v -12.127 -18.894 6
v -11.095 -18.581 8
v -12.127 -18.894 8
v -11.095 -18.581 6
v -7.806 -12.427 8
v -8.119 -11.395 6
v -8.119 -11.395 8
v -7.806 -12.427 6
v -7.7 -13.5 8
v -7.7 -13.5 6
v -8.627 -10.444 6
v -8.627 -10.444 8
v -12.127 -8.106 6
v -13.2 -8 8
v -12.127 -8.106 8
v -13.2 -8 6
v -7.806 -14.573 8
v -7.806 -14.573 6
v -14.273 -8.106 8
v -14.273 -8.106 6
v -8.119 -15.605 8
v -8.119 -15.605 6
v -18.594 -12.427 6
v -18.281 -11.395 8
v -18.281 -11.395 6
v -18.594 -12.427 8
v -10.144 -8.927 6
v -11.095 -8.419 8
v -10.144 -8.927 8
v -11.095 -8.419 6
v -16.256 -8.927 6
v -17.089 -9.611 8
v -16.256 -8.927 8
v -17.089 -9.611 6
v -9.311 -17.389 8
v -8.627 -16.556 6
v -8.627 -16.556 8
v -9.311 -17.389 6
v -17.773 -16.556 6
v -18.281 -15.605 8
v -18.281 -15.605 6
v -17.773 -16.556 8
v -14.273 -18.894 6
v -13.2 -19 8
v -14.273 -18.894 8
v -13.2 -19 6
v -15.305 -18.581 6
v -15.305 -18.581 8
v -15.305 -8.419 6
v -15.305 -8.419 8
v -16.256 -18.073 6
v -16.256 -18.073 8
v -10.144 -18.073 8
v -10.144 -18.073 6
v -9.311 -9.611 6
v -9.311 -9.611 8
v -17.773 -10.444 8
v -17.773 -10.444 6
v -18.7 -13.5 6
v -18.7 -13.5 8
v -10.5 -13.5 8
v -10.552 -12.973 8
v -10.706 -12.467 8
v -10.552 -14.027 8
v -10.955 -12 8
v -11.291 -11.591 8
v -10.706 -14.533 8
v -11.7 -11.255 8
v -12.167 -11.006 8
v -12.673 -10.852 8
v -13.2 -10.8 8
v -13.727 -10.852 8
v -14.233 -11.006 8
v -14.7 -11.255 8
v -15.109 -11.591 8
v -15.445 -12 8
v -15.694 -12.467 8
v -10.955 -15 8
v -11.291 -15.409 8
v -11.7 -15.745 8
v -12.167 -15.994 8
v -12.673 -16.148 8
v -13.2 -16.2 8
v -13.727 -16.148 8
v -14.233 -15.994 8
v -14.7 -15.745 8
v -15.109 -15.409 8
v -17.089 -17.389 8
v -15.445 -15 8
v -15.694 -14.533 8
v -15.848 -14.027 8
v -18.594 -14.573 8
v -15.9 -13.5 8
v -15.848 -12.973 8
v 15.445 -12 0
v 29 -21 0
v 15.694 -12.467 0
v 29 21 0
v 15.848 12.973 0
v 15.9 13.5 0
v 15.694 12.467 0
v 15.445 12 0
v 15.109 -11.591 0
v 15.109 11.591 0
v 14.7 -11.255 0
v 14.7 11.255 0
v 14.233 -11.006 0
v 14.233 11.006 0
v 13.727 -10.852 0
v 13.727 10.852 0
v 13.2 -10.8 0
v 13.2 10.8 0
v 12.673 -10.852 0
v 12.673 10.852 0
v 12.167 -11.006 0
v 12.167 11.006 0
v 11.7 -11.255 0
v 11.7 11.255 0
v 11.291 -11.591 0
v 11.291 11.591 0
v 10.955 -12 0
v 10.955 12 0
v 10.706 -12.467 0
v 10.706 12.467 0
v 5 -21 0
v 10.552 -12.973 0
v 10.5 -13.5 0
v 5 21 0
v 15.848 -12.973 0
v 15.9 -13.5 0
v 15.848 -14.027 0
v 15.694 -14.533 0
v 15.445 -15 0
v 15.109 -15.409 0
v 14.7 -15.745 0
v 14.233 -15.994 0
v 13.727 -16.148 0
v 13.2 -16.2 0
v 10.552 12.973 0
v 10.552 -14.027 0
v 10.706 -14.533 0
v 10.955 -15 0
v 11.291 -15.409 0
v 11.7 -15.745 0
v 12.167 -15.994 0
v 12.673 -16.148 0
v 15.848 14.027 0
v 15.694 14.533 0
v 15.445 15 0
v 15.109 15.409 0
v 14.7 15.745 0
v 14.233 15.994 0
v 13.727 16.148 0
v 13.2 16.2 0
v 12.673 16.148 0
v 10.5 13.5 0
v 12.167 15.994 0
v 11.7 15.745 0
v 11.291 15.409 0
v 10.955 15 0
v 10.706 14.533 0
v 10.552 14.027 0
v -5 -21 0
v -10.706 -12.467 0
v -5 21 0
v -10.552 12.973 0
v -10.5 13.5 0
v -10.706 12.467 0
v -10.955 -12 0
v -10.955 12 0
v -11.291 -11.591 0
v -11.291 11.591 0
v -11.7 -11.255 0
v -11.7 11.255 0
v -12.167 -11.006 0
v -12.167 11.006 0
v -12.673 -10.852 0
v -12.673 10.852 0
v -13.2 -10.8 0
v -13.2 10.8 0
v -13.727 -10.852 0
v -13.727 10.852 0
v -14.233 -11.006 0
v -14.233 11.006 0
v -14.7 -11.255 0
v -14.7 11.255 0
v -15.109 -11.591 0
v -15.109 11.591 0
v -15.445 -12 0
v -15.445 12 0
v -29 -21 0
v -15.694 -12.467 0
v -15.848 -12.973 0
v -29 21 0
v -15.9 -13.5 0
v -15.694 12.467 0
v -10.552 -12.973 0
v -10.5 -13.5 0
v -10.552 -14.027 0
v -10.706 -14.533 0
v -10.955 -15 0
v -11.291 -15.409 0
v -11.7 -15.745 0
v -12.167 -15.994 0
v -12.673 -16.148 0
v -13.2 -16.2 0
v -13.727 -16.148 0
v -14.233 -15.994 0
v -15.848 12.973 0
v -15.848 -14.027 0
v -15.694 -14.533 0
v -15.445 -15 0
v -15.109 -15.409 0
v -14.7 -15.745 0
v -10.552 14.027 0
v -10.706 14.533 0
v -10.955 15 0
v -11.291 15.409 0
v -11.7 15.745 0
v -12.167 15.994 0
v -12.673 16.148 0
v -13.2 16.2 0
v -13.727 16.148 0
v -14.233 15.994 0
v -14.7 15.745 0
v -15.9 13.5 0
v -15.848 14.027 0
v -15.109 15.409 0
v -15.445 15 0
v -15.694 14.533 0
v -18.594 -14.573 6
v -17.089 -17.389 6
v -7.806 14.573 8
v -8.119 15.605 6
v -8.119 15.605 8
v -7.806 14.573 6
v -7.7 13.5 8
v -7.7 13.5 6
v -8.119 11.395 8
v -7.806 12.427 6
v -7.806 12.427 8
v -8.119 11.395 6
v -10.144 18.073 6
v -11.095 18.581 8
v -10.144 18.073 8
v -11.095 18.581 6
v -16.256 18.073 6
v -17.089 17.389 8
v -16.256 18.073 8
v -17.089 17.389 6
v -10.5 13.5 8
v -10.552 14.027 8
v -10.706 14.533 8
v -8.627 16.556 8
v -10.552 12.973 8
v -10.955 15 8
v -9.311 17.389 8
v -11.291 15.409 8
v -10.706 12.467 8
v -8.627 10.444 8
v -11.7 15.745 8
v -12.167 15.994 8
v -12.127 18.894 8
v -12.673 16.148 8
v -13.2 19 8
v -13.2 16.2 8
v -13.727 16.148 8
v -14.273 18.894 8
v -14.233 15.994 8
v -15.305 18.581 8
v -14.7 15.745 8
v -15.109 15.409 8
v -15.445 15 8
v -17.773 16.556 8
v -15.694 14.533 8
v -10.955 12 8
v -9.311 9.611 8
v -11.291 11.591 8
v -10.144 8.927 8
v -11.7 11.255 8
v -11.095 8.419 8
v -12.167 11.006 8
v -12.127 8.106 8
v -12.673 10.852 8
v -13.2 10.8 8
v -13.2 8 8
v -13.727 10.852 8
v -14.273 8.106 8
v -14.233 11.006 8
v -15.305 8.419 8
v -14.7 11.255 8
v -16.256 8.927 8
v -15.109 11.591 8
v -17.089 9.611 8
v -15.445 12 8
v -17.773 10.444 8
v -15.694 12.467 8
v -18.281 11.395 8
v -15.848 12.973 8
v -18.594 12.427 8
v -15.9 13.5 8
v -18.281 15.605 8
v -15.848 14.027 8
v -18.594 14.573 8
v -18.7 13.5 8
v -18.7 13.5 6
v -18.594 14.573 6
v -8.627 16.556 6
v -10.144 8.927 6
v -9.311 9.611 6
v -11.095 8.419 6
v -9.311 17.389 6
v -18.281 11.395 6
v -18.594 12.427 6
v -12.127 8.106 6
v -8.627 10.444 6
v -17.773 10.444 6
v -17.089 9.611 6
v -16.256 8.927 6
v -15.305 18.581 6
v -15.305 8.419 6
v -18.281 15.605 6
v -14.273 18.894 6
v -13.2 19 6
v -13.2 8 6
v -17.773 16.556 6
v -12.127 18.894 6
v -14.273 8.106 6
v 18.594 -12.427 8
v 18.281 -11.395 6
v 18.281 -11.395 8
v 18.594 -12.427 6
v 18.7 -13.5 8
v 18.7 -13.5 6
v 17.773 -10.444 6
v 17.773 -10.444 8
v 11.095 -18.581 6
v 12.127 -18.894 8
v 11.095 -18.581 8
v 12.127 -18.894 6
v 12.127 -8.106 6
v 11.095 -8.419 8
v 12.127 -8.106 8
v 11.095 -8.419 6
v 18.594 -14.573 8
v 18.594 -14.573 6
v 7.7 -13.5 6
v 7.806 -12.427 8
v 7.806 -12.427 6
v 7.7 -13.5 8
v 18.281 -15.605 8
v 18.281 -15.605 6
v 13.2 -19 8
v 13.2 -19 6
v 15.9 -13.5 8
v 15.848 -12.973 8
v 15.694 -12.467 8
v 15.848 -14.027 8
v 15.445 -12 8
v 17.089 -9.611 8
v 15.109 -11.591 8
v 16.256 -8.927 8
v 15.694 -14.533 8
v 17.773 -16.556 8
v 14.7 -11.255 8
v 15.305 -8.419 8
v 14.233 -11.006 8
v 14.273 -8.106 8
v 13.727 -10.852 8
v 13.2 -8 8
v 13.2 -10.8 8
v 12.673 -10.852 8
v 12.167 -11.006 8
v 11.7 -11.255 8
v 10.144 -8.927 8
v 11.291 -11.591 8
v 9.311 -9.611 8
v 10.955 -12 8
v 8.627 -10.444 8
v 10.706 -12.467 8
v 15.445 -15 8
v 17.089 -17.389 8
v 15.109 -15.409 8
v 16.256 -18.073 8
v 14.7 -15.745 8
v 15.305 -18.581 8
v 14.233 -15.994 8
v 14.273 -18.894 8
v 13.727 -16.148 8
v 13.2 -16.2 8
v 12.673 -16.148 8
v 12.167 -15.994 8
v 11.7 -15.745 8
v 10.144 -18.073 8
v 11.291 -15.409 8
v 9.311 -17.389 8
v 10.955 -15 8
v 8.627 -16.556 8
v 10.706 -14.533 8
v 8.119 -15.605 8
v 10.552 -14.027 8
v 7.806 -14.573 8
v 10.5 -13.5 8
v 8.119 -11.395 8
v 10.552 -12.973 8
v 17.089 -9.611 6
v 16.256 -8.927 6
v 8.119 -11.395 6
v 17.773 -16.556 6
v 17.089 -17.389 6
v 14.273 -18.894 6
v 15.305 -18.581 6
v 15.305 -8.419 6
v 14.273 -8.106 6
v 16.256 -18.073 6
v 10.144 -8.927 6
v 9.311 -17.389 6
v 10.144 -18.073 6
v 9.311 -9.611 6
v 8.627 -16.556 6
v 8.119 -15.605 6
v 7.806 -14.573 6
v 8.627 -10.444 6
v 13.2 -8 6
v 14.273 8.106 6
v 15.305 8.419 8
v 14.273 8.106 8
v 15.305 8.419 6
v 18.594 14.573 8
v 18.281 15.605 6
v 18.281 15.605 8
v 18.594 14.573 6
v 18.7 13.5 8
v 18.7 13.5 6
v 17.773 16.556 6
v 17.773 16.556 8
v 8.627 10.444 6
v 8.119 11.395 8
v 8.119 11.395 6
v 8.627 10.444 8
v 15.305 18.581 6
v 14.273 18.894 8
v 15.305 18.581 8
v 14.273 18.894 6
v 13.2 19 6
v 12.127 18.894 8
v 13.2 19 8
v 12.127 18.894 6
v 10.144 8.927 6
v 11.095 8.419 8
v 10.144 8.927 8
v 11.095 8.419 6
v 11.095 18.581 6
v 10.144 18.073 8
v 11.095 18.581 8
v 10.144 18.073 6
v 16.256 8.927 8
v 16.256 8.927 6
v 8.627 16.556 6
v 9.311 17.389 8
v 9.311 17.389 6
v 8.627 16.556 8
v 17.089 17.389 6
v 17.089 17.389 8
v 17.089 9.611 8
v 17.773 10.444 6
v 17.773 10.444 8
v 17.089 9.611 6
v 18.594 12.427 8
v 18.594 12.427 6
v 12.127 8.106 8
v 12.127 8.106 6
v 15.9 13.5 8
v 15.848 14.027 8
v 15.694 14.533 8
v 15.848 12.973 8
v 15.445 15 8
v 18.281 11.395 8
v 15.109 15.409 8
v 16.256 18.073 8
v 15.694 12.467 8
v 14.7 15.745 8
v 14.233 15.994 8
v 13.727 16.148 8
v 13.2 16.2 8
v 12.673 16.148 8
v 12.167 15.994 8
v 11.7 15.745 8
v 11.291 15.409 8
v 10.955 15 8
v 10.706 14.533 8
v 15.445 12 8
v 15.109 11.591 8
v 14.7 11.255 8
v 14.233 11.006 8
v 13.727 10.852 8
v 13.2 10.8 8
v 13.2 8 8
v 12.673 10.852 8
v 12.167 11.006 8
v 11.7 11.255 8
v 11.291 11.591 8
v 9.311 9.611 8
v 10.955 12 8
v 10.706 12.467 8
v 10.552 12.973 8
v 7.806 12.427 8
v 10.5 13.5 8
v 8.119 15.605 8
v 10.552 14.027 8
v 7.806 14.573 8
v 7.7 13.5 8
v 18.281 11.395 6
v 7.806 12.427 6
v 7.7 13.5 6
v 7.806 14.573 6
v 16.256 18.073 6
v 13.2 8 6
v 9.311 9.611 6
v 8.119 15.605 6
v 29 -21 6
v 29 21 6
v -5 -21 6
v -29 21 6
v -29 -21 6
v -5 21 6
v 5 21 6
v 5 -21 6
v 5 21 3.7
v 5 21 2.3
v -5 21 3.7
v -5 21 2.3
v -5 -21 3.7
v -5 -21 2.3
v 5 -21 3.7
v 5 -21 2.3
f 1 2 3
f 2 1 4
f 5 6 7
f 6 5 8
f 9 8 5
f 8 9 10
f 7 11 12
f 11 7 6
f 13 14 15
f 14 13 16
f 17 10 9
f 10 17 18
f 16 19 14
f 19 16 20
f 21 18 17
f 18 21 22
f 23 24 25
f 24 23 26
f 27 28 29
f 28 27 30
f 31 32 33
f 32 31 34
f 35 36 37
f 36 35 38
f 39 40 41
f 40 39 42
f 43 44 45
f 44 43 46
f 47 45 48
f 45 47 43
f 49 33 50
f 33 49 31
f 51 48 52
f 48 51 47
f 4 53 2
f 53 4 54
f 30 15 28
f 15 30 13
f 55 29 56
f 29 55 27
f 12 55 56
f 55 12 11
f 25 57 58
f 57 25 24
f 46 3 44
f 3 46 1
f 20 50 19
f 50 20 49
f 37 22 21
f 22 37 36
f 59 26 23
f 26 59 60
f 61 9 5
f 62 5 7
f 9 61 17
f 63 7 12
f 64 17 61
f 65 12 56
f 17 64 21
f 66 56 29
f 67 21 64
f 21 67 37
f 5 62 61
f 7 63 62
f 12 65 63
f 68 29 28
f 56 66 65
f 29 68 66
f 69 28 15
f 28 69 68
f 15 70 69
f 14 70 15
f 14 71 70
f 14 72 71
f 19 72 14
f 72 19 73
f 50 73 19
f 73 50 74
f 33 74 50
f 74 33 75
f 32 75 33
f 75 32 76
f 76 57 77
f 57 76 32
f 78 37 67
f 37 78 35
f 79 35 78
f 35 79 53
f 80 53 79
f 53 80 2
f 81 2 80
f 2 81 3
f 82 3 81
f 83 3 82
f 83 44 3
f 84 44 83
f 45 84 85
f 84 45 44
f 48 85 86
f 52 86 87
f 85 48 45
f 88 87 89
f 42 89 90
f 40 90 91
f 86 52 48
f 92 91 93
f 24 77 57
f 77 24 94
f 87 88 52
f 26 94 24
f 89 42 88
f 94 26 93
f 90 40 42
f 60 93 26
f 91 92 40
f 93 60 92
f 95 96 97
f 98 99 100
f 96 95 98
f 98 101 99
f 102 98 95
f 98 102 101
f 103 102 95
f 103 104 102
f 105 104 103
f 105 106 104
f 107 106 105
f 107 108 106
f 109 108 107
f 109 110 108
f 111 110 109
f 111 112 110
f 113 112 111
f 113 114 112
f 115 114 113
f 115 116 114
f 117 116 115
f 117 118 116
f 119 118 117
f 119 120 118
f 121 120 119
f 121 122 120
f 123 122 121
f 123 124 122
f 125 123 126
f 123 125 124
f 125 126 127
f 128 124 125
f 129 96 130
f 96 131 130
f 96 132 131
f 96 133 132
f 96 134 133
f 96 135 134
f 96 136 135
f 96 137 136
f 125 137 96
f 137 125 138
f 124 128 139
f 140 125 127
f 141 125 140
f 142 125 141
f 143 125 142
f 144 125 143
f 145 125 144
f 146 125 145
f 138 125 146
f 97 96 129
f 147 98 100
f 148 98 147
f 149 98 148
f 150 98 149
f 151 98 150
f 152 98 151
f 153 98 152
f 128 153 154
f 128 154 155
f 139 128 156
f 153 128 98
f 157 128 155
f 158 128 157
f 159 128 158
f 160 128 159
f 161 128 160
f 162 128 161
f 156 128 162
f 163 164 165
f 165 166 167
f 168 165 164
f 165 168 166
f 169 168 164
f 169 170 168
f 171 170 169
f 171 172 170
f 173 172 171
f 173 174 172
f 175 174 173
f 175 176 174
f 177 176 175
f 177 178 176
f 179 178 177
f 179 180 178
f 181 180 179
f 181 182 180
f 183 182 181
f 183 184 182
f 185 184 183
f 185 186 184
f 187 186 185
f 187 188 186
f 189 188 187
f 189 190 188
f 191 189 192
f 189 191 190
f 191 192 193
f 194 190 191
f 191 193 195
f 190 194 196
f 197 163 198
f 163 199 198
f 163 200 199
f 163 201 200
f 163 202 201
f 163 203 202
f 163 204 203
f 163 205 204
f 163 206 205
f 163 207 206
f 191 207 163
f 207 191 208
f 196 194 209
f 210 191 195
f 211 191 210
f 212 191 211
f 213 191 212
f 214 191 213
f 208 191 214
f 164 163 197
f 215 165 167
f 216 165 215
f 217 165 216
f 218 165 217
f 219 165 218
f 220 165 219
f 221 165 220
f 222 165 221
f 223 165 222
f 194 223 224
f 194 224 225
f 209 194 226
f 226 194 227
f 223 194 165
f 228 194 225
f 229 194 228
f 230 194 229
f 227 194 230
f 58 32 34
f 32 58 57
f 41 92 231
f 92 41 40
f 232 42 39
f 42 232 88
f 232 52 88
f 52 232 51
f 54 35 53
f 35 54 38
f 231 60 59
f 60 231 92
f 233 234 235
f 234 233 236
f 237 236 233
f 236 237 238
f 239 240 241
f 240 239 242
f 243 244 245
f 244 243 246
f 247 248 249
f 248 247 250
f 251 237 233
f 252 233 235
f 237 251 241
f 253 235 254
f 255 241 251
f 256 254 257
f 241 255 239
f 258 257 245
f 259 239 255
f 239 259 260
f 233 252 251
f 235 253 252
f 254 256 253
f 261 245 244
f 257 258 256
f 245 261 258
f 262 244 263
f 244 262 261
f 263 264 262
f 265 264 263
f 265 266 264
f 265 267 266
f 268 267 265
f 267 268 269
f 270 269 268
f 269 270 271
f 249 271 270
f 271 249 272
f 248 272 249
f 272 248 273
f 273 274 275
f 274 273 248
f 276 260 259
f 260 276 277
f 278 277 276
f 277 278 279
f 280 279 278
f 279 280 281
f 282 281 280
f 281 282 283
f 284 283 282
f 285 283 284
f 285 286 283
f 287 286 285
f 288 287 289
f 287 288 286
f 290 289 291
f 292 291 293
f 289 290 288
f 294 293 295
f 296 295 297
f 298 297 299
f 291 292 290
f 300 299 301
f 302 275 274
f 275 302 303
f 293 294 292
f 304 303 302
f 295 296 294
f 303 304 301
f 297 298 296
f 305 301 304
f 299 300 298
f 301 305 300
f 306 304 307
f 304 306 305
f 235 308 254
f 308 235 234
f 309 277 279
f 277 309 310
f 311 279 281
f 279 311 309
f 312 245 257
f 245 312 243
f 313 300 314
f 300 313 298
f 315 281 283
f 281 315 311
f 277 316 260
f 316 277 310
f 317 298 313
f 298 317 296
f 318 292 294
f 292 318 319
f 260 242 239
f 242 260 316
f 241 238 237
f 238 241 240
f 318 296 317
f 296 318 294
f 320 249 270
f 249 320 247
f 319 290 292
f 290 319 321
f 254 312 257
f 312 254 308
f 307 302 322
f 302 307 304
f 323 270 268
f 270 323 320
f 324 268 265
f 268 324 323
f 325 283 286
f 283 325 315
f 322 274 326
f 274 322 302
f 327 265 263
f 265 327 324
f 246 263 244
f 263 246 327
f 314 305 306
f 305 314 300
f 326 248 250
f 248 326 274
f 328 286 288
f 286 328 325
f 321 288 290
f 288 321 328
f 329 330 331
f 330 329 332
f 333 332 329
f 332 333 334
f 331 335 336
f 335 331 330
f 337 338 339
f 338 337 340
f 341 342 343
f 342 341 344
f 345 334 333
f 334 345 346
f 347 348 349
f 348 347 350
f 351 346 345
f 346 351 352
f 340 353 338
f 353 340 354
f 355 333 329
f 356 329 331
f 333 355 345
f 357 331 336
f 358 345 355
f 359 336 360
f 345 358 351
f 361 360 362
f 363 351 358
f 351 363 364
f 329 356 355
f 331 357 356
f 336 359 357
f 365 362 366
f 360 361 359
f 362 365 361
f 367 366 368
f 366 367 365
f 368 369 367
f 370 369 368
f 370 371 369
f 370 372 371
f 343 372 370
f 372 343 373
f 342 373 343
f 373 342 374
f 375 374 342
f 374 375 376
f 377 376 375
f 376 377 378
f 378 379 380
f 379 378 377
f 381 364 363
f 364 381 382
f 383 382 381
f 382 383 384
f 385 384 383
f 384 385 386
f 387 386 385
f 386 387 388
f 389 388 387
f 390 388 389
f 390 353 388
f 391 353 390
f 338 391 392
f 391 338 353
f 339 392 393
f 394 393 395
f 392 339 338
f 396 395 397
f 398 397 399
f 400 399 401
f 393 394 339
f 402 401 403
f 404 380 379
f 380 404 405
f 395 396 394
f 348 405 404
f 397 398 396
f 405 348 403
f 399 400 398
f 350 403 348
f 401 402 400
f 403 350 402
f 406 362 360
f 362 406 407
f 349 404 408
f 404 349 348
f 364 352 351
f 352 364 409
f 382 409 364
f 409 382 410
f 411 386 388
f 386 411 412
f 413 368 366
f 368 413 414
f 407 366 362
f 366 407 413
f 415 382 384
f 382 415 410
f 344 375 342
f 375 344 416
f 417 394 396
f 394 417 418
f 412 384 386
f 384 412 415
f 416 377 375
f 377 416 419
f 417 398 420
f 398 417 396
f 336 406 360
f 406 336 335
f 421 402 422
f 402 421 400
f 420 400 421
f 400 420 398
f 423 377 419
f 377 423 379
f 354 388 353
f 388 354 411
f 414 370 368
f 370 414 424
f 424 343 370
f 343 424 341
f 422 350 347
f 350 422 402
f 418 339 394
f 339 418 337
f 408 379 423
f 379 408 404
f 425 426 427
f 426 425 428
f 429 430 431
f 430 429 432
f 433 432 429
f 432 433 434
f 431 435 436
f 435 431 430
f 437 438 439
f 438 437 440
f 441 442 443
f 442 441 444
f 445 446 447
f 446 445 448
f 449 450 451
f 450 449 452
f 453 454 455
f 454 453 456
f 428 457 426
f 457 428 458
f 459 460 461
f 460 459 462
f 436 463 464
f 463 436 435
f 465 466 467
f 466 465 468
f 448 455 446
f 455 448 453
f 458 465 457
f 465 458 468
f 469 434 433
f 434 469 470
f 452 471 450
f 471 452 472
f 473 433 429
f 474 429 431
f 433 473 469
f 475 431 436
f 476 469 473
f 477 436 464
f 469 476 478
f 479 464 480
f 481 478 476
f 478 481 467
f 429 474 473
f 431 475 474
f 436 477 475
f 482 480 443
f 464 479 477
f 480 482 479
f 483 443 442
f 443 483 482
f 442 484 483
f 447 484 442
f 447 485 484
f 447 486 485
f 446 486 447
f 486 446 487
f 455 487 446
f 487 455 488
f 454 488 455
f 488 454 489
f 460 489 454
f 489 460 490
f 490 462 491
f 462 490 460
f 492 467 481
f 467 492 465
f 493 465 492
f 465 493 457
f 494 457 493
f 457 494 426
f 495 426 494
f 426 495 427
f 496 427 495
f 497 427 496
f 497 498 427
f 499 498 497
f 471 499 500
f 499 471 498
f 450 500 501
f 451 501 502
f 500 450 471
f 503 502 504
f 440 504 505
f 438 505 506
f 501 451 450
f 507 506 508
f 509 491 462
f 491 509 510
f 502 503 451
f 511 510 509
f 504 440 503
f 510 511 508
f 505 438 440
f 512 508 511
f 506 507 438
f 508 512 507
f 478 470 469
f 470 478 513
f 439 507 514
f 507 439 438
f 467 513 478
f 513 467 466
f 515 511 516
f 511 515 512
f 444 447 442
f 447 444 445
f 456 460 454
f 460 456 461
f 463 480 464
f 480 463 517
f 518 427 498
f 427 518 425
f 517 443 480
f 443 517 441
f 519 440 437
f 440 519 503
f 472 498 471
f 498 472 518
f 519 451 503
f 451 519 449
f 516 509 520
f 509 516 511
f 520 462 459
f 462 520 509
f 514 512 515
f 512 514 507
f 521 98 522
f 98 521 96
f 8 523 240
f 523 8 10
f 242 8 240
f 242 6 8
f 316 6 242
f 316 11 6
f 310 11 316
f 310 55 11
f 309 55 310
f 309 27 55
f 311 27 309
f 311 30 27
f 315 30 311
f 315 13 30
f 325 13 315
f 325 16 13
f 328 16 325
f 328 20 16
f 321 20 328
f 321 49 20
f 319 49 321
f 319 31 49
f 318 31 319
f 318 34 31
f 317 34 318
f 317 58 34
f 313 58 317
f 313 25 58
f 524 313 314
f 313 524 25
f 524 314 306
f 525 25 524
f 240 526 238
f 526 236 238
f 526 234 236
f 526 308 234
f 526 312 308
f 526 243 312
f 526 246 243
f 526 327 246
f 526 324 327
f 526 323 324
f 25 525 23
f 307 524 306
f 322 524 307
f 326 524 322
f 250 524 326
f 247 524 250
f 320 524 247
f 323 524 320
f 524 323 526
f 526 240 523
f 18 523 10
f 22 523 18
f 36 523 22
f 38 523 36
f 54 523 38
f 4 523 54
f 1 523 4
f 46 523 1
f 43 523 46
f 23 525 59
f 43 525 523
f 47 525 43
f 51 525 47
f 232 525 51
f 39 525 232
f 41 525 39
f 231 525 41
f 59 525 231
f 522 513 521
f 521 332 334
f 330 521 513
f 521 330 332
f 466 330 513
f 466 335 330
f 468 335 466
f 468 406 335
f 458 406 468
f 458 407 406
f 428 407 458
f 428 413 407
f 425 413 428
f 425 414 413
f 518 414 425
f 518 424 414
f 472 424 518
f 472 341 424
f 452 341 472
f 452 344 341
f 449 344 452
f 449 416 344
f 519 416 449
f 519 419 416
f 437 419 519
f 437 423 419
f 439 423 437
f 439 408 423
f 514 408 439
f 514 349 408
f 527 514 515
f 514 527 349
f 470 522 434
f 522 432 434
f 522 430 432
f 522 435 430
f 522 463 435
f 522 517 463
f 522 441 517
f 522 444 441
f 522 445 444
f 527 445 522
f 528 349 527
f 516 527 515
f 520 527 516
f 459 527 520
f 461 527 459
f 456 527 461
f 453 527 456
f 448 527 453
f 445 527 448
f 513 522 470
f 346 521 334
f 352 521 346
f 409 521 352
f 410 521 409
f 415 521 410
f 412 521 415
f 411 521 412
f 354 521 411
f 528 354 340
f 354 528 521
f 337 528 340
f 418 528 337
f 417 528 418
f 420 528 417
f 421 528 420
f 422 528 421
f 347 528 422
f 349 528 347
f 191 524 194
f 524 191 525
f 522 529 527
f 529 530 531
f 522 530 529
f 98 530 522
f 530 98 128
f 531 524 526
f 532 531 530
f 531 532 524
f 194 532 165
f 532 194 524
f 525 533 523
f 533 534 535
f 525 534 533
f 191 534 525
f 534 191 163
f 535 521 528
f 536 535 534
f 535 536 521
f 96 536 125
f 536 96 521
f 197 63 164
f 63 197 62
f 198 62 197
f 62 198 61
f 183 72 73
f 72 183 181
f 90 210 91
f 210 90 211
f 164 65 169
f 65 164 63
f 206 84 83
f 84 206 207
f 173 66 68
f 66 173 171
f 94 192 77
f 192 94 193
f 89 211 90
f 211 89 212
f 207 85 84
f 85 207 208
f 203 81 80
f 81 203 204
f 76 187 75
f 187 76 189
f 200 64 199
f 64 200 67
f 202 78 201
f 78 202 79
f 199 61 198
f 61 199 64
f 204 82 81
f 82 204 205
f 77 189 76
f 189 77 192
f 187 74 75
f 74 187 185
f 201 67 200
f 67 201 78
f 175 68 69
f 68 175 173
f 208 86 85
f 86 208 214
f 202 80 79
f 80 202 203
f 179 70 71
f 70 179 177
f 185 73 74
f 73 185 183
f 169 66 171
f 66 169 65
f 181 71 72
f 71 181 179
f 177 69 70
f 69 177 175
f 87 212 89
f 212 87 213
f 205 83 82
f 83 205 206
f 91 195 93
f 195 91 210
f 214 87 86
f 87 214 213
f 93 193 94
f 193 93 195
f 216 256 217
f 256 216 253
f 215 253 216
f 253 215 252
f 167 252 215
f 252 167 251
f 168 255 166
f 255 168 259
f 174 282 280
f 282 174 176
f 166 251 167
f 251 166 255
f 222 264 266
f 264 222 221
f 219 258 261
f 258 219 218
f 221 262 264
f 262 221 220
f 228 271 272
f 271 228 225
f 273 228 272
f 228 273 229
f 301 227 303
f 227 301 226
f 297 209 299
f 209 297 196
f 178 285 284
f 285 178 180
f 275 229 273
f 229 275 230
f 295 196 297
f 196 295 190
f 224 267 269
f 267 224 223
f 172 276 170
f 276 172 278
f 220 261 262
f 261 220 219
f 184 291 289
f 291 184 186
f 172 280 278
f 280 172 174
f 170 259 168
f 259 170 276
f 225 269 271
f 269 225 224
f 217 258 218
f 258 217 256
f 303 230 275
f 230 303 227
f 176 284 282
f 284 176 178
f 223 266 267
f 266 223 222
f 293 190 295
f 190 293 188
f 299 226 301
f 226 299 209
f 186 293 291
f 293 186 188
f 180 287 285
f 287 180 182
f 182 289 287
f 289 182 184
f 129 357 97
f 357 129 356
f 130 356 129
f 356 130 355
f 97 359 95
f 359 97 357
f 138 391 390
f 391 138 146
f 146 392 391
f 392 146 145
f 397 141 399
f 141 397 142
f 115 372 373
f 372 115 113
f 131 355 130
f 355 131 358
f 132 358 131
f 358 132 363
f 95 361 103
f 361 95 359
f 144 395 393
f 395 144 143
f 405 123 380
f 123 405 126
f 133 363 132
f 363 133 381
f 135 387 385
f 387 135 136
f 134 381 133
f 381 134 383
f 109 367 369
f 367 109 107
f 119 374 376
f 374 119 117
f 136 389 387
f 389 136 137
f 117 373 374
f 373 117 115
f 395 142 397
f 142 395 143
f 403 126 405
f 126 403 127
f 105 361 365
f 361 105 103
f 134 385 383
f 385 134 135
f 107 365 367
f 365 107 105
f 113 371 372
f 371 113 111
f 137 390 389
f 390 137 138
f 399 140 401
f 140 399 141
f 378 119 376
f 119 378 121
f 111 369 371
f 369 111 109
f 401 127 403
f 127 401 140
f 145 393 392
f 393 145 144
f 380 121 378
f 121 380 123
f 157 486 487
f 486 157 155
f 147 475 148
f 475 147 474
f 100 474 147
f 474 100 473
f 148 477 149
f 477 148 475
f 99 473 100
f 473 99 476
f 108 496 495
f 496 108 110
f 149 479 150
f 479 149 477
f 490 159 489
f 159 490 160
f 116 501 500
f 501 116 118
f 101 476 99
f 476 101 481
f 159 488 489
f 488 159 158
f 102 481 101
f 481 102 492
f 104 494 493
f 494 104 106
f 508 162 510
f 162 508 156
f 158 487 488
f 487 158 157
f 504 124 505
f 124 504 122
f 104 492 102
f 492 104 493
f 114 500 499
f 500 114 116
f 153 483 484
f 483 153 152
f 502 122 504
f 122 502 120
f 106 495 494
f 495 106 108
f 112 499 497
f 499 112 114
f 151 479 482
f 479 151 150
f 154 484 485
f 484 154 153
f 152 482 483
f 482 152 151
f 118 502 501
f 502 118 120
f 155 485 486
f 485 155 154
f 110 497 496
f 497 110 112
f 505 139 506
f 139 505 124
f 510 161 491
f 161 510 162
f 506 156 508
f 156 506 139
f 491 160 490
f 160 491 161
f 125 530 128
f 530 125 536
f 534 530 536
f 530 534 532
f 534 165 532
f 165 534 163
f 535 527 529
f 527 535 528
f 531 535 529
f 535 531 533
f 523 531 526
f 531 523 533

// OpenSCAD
$fn = 32;

// ----------------------------------------------------------------------
// Living hinge: 58 x 42 mm plates, 1.4 mm flexible web
// ----------------------------------------------------------------------

// --- parameters (mm) ---
plate_len = 24;           // plate length outside the web
plate_w = 42;             // plate width
thick = 6;                // plate thickness
web_half = 5;             // half width of the flex band
web_t = 1.4;              // flexible web thickness
web_z = 2.3;              // web position inside the thickness
boss_d = 11;              // screw boss diameter
boss_h = 8;               // screw boss height
boss_x = 13.2;            // screw boss distance from the web
screw_d = 5.4;            // screw hole

difference() {
  union() {
    /* one flat strip, later thinned at the middle */
    translate([-29, -21, 0]) cube([58, 42, 6]);
    /* screw bosses, sunk 0.5 mm into the plates */
    for (sx = [-13.2, 13.2]) {
      for (sy = [-13.5, 13.5]) {
        translate([sx, sy, 0]) cylinder(h = boss_h, d = boss_d);
      }
    }
  }
  /* channel from below: leaves the web on top of it */
  translate([-5, -23.5, -2.5]) cube([10, 47, 4.8]);
  /* channel from above: thins the web down to web_t */
  translate([-5, -23.5, 3.7]) cube([10, 47, 4.8]);
  /* screw holes through the bosses */
  for (sx = [-13.2, 13.2]) {
    for (sy = [-13.5, 13.5]) {
      translate([sx, sy, -2.5]) cylinder(h = boss_h + 5, d = screw_d);
    }
  }
}
